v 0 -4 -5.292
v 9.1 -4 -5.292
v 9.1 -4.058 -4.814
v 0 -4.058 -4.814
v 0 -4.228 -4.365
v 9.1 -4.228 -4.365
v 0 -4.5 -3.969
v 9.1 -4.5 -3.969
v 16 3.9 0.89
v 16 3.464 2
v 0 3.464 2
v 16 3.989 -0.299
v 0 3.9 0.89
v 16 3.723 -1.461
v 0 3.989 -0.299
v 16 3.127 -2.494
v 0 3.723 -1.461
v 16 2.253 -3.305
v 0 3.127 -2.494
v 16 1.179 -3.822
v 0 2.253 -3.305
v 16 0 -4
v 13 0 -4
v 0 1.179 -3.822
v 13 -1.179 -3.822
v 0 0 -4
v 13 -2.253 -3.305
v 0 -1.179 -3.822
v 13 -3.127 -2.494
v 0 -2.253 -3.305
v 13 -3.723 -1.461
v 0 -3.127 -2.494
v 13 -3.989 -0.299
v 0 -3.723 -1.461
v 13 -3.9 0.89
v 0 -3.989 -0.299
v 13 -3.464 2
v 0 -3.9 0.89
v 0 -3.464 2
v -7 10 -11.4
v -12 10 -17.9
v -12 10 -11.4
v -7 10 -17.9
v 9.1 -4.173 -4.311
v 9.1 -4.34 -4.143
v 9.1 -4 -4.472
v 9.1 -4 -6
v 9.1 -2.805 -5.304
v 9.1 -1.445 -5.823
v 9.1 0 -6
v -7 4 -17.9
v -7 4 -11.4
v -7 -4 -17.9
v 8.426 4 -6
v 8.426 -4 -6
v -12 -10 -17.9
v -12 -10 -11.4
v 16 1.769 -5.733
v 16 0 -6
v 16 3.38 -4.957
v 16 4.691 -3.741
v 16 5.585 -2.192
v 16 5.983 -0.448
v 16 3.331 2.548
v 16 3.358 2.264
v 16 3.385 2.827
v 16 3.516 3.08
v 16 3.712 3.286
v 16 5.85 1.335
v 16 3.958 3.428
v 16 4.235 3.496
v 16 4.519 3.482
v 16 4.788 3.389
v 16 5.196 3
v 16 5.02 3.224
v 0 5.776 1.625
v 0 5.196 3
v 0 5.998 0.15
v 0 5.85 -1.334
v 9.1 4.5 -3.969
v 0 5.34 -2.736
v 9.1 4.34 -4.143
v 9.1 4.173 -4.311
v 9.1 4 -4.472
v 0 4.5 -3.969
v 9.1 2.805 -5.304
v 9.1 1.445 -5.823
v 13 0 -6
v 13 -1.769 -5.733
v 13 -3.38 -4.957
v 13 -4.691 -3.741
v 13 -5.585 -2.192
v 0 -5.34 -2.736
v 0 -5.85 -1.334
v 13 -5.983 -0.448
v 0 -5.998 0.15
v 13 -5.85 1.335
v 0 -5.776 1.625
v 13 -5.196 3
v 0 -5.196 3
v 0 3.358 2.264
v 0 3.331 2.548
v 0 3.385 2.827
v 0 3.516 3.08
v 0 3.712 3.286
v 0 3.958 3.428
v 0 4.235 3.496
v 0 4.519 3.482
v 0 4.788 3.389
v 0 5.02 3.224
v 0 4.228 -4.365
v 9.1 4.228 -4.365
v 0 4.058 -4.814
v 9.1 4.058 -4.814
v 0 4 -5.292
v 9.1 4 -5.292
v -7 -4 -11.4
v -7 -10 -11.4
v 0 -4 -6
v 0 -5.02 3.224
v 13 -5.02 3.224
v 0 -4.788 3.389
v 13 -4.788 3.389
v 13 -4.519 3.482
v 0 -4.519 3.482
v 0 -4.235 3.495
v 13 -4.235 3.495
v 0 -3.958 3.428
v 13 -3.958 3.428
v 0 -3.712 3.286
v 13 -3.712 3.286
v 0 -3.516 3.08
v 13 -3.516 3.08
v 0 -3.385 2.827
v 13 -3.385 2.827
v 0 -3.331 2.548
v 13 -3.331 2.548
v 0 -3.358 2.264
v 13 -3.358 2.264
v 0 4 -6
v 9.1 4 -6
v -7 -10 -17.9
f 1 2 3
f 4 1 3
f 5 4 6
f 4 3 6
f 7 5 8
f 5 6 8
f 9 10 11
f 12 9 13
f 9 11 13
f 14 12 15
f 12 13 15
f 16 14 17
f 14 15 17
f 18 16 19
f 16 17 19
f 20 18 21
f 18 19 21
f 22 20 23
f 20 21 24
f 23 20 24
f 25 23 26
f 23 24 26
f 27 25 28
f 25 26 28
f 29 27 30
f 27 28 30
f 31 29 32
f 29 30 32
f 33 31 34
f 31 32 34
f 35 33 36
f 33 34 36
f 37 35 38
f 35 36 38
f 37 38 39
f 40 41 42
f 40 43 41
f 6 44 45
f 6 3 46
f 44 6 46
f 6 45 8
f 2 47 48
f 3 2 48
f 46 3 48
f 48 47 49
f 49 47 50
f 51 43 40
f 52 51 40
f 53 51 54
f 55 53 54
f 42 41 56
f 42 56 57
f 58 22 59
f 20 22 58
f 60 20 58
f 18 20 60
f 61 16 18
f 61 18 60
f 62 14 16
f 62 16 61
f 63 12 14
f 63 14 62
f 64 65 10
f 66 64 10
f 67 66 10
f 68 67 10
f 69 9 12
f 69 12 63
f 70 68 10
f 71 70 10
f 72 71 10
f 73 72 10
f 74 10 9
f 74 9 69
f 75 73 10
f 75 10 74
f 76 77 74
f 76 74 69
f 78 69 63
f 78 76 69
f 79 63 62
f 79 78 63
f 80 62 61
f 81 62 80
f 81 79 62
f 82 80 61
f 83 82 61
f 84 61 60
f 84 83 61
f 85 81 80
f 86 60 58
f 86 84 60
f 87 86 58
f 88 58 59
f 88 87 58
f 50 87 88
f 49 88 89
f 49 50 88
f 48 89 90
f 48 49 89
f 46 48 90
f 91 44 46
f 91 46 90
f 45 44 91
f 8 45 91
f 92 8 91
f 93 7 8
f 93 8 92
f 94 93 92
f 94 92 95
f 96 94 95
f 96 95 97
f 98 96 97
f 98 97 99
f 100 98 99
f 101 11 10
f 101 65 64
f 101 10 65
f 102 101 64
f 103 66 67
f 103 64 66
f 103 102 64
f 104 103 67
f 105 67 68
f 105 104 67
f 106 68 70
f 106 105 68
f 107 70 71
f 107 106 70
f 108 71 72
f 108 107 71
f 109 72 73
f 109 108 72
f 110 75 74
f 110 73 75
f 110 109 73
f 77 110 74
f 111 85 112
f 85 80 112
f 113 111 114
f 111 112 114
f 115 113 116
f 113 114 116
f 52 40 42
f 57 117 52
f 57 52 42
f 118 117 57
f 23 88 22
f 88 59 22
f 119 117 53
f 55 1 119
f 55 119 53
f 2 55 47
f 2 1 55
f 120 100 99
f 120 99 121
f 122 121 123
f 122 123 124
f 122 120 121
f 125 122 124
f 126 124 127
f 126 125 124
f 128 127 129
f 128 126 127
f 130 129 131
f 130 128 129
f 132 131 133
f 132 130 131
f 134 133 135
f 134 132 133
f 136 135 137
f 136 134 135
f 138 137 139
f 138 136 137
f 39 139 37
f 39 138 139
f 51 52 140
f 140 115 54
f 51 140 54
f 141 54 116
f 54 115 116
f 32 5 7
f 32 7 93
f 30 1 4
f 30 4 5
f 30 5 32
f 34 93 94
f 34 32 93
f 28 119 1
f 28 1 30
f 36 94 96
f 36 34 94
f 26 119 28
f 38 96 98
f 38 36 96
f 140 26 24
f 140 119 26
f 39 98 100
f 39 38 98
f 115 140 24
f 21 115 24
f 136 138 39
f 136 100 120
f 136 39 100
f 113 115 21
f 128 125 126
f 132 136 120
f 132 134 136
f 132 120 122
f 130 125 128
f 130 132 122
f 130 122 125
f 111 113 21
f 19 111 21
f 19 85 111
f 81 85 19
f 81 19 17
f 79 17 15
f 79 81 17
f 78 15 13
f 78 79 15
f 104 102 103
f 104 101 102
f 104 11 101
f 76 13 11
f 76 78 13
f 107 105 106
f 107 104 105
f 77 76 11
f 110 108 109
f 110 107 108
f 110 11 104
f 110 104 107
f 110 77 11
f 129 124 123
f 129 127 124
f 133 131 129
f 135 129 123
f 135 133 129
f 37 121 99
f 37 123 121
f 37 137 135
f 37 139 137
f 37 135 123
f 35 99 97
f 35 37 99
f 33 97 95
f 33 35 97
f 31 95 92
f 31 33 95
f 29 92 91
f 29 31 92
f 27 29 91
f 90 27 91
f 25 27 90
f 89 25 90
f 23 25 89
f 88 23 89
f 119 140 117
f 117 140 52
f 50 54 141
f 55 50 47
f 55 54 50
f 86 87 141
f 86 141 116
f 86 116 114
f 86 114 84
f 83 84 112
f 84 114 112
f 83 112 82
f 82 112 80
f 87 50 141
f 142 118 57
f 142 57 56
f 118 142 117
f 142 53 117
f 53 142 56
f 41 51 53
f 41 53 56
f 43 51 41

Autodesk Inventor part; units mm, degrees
ref_plane "YZ Plane" through (0, 0, 0) normal (1, 0, 0) x (0, 1, 0)
sketch "Sketch1" plane through (0, 0, 0) normal (1, 0, 0) x (0, 1, 0)
  arc A0 (-3.4641, 2) -> (3.4641, 2) centre (0, 0) ccw
  arc A1 (-5.1962, 3) -> (5.1962, 3) centre (0, 0) ccw
  arc A2 (5.1962, 3) -> (3.4641, 2) centre (4.3301, 2.5) ccw
  arc A3 (-3.4641, 2) -> (-5.1962, 3) centre (-4.3301, 2.5) ccw
  dimension "d0" = 8
  dimension "d1" = 12
  dimension "d2" = 2.5
extrude "Extrusion1" add sketch "Sketch1" along normal blind 16
sketch "Sketch4" plane through (16, 0, 0) normal (1, 0, 0) x (0, 0, -1)
  point P0 (0, 0)
sketch "Sketch5" plane through (16, 0, 0) normal (1, 0, 0) x (0, 0, -1)
  line L0 (-6.2503, -10.1933) -> (7.7655, -10.1933)
  line L1 (7.7655, -10.1933) -> (7.7655, 0)
  line L2 (7.7655, 0) -> (-6.2503, 0)
  line L3 (-6.2503, 0) -> (-6.2503, -10.1933)
  point P0 (0, 0)
extrude "Extrusion4" cut sketch "Sketch5" against normal blind 3
ref_plane "Work Plane1" through (-7, 0, 0) normal (-1, 0, 0) x (0, 0, 1)
sketch "Sketch9" plane through (-7, 0, 0) normal (-1, 0, 0) x (0, 0, 1)
  line L0 (-17.9, 10) -> (-11.4, 10)
  line L1 (-11.4, 10) -> (-11.4, -10)
  line L2 (-11.4, -10) -> (-17.9, -10)
  line L3 (-17.9, -10) -> (-17.9, 10)
  point P0 (0, 0)
  point P1 (-17.9, 0)
  dimension "d34" = 11.4
  dimension "d35" = 6.5
  dimension "d36" = 20
extrude "Extrusion8" add sketch "Sketch9" along normal blind 5
ref_plane "Work Plane2" through (-7, 0, -17.9) normal (0, -1, 0) x (1, 0, 0)
sketch "Sketch10" plane through (-7, 0, -17.9) normal (0, -1, 0) x (1, 0, 0)
  line L0 (7, 11) -> (23, 11) projected
  line L1 (0, 0) -> (0, 6.5) projected
  line L2 (7, 11.9) -> (0, 6.5)
  line L3 (0, 0) -> (-5, 0) projected
  line L4 (0, 6.5) -> (0, 0)
  line L5 (0, 0) -> (15.4259, 11.9)
  line L6 (7, 11.9) -> (7, 20.9) projected
  line L7 (15.4259, 11.9) -> (7, 11.9)
  point P0 (7, 17.9)
extrude "Extrusion9" add sketch "Sketch10" along normal mid plane 8
sketch "Sketch11" plane through (0, 0, 0) normal (-1, 0, 0) x (0, 0, 1)
  line L0 (-6, -4) -> (-6, 0) projected
  line L1 (-6, -4) -> (-4.4721, -4)
  arc A0 (-6, 0) -> (3, -5.1962) centre (0, 0) ccw projected
  line L2 (-6, 4) -> (-6, 0) projected
  line L3 (-6, 4) -> (-4.4721, 4)
  arc A1 (3, 5.1962) -> (-6, 0) centre (0, 0) ccw projected
extrude "Extrusion10" add sketch "Sketch11" against normal blind 9.1
fillet "Fillet3" radius 2 2 edges at (4.55, 4, -4.4721) (4.55, -4, -4.4721)
properties part number "Roller_Spacer"
